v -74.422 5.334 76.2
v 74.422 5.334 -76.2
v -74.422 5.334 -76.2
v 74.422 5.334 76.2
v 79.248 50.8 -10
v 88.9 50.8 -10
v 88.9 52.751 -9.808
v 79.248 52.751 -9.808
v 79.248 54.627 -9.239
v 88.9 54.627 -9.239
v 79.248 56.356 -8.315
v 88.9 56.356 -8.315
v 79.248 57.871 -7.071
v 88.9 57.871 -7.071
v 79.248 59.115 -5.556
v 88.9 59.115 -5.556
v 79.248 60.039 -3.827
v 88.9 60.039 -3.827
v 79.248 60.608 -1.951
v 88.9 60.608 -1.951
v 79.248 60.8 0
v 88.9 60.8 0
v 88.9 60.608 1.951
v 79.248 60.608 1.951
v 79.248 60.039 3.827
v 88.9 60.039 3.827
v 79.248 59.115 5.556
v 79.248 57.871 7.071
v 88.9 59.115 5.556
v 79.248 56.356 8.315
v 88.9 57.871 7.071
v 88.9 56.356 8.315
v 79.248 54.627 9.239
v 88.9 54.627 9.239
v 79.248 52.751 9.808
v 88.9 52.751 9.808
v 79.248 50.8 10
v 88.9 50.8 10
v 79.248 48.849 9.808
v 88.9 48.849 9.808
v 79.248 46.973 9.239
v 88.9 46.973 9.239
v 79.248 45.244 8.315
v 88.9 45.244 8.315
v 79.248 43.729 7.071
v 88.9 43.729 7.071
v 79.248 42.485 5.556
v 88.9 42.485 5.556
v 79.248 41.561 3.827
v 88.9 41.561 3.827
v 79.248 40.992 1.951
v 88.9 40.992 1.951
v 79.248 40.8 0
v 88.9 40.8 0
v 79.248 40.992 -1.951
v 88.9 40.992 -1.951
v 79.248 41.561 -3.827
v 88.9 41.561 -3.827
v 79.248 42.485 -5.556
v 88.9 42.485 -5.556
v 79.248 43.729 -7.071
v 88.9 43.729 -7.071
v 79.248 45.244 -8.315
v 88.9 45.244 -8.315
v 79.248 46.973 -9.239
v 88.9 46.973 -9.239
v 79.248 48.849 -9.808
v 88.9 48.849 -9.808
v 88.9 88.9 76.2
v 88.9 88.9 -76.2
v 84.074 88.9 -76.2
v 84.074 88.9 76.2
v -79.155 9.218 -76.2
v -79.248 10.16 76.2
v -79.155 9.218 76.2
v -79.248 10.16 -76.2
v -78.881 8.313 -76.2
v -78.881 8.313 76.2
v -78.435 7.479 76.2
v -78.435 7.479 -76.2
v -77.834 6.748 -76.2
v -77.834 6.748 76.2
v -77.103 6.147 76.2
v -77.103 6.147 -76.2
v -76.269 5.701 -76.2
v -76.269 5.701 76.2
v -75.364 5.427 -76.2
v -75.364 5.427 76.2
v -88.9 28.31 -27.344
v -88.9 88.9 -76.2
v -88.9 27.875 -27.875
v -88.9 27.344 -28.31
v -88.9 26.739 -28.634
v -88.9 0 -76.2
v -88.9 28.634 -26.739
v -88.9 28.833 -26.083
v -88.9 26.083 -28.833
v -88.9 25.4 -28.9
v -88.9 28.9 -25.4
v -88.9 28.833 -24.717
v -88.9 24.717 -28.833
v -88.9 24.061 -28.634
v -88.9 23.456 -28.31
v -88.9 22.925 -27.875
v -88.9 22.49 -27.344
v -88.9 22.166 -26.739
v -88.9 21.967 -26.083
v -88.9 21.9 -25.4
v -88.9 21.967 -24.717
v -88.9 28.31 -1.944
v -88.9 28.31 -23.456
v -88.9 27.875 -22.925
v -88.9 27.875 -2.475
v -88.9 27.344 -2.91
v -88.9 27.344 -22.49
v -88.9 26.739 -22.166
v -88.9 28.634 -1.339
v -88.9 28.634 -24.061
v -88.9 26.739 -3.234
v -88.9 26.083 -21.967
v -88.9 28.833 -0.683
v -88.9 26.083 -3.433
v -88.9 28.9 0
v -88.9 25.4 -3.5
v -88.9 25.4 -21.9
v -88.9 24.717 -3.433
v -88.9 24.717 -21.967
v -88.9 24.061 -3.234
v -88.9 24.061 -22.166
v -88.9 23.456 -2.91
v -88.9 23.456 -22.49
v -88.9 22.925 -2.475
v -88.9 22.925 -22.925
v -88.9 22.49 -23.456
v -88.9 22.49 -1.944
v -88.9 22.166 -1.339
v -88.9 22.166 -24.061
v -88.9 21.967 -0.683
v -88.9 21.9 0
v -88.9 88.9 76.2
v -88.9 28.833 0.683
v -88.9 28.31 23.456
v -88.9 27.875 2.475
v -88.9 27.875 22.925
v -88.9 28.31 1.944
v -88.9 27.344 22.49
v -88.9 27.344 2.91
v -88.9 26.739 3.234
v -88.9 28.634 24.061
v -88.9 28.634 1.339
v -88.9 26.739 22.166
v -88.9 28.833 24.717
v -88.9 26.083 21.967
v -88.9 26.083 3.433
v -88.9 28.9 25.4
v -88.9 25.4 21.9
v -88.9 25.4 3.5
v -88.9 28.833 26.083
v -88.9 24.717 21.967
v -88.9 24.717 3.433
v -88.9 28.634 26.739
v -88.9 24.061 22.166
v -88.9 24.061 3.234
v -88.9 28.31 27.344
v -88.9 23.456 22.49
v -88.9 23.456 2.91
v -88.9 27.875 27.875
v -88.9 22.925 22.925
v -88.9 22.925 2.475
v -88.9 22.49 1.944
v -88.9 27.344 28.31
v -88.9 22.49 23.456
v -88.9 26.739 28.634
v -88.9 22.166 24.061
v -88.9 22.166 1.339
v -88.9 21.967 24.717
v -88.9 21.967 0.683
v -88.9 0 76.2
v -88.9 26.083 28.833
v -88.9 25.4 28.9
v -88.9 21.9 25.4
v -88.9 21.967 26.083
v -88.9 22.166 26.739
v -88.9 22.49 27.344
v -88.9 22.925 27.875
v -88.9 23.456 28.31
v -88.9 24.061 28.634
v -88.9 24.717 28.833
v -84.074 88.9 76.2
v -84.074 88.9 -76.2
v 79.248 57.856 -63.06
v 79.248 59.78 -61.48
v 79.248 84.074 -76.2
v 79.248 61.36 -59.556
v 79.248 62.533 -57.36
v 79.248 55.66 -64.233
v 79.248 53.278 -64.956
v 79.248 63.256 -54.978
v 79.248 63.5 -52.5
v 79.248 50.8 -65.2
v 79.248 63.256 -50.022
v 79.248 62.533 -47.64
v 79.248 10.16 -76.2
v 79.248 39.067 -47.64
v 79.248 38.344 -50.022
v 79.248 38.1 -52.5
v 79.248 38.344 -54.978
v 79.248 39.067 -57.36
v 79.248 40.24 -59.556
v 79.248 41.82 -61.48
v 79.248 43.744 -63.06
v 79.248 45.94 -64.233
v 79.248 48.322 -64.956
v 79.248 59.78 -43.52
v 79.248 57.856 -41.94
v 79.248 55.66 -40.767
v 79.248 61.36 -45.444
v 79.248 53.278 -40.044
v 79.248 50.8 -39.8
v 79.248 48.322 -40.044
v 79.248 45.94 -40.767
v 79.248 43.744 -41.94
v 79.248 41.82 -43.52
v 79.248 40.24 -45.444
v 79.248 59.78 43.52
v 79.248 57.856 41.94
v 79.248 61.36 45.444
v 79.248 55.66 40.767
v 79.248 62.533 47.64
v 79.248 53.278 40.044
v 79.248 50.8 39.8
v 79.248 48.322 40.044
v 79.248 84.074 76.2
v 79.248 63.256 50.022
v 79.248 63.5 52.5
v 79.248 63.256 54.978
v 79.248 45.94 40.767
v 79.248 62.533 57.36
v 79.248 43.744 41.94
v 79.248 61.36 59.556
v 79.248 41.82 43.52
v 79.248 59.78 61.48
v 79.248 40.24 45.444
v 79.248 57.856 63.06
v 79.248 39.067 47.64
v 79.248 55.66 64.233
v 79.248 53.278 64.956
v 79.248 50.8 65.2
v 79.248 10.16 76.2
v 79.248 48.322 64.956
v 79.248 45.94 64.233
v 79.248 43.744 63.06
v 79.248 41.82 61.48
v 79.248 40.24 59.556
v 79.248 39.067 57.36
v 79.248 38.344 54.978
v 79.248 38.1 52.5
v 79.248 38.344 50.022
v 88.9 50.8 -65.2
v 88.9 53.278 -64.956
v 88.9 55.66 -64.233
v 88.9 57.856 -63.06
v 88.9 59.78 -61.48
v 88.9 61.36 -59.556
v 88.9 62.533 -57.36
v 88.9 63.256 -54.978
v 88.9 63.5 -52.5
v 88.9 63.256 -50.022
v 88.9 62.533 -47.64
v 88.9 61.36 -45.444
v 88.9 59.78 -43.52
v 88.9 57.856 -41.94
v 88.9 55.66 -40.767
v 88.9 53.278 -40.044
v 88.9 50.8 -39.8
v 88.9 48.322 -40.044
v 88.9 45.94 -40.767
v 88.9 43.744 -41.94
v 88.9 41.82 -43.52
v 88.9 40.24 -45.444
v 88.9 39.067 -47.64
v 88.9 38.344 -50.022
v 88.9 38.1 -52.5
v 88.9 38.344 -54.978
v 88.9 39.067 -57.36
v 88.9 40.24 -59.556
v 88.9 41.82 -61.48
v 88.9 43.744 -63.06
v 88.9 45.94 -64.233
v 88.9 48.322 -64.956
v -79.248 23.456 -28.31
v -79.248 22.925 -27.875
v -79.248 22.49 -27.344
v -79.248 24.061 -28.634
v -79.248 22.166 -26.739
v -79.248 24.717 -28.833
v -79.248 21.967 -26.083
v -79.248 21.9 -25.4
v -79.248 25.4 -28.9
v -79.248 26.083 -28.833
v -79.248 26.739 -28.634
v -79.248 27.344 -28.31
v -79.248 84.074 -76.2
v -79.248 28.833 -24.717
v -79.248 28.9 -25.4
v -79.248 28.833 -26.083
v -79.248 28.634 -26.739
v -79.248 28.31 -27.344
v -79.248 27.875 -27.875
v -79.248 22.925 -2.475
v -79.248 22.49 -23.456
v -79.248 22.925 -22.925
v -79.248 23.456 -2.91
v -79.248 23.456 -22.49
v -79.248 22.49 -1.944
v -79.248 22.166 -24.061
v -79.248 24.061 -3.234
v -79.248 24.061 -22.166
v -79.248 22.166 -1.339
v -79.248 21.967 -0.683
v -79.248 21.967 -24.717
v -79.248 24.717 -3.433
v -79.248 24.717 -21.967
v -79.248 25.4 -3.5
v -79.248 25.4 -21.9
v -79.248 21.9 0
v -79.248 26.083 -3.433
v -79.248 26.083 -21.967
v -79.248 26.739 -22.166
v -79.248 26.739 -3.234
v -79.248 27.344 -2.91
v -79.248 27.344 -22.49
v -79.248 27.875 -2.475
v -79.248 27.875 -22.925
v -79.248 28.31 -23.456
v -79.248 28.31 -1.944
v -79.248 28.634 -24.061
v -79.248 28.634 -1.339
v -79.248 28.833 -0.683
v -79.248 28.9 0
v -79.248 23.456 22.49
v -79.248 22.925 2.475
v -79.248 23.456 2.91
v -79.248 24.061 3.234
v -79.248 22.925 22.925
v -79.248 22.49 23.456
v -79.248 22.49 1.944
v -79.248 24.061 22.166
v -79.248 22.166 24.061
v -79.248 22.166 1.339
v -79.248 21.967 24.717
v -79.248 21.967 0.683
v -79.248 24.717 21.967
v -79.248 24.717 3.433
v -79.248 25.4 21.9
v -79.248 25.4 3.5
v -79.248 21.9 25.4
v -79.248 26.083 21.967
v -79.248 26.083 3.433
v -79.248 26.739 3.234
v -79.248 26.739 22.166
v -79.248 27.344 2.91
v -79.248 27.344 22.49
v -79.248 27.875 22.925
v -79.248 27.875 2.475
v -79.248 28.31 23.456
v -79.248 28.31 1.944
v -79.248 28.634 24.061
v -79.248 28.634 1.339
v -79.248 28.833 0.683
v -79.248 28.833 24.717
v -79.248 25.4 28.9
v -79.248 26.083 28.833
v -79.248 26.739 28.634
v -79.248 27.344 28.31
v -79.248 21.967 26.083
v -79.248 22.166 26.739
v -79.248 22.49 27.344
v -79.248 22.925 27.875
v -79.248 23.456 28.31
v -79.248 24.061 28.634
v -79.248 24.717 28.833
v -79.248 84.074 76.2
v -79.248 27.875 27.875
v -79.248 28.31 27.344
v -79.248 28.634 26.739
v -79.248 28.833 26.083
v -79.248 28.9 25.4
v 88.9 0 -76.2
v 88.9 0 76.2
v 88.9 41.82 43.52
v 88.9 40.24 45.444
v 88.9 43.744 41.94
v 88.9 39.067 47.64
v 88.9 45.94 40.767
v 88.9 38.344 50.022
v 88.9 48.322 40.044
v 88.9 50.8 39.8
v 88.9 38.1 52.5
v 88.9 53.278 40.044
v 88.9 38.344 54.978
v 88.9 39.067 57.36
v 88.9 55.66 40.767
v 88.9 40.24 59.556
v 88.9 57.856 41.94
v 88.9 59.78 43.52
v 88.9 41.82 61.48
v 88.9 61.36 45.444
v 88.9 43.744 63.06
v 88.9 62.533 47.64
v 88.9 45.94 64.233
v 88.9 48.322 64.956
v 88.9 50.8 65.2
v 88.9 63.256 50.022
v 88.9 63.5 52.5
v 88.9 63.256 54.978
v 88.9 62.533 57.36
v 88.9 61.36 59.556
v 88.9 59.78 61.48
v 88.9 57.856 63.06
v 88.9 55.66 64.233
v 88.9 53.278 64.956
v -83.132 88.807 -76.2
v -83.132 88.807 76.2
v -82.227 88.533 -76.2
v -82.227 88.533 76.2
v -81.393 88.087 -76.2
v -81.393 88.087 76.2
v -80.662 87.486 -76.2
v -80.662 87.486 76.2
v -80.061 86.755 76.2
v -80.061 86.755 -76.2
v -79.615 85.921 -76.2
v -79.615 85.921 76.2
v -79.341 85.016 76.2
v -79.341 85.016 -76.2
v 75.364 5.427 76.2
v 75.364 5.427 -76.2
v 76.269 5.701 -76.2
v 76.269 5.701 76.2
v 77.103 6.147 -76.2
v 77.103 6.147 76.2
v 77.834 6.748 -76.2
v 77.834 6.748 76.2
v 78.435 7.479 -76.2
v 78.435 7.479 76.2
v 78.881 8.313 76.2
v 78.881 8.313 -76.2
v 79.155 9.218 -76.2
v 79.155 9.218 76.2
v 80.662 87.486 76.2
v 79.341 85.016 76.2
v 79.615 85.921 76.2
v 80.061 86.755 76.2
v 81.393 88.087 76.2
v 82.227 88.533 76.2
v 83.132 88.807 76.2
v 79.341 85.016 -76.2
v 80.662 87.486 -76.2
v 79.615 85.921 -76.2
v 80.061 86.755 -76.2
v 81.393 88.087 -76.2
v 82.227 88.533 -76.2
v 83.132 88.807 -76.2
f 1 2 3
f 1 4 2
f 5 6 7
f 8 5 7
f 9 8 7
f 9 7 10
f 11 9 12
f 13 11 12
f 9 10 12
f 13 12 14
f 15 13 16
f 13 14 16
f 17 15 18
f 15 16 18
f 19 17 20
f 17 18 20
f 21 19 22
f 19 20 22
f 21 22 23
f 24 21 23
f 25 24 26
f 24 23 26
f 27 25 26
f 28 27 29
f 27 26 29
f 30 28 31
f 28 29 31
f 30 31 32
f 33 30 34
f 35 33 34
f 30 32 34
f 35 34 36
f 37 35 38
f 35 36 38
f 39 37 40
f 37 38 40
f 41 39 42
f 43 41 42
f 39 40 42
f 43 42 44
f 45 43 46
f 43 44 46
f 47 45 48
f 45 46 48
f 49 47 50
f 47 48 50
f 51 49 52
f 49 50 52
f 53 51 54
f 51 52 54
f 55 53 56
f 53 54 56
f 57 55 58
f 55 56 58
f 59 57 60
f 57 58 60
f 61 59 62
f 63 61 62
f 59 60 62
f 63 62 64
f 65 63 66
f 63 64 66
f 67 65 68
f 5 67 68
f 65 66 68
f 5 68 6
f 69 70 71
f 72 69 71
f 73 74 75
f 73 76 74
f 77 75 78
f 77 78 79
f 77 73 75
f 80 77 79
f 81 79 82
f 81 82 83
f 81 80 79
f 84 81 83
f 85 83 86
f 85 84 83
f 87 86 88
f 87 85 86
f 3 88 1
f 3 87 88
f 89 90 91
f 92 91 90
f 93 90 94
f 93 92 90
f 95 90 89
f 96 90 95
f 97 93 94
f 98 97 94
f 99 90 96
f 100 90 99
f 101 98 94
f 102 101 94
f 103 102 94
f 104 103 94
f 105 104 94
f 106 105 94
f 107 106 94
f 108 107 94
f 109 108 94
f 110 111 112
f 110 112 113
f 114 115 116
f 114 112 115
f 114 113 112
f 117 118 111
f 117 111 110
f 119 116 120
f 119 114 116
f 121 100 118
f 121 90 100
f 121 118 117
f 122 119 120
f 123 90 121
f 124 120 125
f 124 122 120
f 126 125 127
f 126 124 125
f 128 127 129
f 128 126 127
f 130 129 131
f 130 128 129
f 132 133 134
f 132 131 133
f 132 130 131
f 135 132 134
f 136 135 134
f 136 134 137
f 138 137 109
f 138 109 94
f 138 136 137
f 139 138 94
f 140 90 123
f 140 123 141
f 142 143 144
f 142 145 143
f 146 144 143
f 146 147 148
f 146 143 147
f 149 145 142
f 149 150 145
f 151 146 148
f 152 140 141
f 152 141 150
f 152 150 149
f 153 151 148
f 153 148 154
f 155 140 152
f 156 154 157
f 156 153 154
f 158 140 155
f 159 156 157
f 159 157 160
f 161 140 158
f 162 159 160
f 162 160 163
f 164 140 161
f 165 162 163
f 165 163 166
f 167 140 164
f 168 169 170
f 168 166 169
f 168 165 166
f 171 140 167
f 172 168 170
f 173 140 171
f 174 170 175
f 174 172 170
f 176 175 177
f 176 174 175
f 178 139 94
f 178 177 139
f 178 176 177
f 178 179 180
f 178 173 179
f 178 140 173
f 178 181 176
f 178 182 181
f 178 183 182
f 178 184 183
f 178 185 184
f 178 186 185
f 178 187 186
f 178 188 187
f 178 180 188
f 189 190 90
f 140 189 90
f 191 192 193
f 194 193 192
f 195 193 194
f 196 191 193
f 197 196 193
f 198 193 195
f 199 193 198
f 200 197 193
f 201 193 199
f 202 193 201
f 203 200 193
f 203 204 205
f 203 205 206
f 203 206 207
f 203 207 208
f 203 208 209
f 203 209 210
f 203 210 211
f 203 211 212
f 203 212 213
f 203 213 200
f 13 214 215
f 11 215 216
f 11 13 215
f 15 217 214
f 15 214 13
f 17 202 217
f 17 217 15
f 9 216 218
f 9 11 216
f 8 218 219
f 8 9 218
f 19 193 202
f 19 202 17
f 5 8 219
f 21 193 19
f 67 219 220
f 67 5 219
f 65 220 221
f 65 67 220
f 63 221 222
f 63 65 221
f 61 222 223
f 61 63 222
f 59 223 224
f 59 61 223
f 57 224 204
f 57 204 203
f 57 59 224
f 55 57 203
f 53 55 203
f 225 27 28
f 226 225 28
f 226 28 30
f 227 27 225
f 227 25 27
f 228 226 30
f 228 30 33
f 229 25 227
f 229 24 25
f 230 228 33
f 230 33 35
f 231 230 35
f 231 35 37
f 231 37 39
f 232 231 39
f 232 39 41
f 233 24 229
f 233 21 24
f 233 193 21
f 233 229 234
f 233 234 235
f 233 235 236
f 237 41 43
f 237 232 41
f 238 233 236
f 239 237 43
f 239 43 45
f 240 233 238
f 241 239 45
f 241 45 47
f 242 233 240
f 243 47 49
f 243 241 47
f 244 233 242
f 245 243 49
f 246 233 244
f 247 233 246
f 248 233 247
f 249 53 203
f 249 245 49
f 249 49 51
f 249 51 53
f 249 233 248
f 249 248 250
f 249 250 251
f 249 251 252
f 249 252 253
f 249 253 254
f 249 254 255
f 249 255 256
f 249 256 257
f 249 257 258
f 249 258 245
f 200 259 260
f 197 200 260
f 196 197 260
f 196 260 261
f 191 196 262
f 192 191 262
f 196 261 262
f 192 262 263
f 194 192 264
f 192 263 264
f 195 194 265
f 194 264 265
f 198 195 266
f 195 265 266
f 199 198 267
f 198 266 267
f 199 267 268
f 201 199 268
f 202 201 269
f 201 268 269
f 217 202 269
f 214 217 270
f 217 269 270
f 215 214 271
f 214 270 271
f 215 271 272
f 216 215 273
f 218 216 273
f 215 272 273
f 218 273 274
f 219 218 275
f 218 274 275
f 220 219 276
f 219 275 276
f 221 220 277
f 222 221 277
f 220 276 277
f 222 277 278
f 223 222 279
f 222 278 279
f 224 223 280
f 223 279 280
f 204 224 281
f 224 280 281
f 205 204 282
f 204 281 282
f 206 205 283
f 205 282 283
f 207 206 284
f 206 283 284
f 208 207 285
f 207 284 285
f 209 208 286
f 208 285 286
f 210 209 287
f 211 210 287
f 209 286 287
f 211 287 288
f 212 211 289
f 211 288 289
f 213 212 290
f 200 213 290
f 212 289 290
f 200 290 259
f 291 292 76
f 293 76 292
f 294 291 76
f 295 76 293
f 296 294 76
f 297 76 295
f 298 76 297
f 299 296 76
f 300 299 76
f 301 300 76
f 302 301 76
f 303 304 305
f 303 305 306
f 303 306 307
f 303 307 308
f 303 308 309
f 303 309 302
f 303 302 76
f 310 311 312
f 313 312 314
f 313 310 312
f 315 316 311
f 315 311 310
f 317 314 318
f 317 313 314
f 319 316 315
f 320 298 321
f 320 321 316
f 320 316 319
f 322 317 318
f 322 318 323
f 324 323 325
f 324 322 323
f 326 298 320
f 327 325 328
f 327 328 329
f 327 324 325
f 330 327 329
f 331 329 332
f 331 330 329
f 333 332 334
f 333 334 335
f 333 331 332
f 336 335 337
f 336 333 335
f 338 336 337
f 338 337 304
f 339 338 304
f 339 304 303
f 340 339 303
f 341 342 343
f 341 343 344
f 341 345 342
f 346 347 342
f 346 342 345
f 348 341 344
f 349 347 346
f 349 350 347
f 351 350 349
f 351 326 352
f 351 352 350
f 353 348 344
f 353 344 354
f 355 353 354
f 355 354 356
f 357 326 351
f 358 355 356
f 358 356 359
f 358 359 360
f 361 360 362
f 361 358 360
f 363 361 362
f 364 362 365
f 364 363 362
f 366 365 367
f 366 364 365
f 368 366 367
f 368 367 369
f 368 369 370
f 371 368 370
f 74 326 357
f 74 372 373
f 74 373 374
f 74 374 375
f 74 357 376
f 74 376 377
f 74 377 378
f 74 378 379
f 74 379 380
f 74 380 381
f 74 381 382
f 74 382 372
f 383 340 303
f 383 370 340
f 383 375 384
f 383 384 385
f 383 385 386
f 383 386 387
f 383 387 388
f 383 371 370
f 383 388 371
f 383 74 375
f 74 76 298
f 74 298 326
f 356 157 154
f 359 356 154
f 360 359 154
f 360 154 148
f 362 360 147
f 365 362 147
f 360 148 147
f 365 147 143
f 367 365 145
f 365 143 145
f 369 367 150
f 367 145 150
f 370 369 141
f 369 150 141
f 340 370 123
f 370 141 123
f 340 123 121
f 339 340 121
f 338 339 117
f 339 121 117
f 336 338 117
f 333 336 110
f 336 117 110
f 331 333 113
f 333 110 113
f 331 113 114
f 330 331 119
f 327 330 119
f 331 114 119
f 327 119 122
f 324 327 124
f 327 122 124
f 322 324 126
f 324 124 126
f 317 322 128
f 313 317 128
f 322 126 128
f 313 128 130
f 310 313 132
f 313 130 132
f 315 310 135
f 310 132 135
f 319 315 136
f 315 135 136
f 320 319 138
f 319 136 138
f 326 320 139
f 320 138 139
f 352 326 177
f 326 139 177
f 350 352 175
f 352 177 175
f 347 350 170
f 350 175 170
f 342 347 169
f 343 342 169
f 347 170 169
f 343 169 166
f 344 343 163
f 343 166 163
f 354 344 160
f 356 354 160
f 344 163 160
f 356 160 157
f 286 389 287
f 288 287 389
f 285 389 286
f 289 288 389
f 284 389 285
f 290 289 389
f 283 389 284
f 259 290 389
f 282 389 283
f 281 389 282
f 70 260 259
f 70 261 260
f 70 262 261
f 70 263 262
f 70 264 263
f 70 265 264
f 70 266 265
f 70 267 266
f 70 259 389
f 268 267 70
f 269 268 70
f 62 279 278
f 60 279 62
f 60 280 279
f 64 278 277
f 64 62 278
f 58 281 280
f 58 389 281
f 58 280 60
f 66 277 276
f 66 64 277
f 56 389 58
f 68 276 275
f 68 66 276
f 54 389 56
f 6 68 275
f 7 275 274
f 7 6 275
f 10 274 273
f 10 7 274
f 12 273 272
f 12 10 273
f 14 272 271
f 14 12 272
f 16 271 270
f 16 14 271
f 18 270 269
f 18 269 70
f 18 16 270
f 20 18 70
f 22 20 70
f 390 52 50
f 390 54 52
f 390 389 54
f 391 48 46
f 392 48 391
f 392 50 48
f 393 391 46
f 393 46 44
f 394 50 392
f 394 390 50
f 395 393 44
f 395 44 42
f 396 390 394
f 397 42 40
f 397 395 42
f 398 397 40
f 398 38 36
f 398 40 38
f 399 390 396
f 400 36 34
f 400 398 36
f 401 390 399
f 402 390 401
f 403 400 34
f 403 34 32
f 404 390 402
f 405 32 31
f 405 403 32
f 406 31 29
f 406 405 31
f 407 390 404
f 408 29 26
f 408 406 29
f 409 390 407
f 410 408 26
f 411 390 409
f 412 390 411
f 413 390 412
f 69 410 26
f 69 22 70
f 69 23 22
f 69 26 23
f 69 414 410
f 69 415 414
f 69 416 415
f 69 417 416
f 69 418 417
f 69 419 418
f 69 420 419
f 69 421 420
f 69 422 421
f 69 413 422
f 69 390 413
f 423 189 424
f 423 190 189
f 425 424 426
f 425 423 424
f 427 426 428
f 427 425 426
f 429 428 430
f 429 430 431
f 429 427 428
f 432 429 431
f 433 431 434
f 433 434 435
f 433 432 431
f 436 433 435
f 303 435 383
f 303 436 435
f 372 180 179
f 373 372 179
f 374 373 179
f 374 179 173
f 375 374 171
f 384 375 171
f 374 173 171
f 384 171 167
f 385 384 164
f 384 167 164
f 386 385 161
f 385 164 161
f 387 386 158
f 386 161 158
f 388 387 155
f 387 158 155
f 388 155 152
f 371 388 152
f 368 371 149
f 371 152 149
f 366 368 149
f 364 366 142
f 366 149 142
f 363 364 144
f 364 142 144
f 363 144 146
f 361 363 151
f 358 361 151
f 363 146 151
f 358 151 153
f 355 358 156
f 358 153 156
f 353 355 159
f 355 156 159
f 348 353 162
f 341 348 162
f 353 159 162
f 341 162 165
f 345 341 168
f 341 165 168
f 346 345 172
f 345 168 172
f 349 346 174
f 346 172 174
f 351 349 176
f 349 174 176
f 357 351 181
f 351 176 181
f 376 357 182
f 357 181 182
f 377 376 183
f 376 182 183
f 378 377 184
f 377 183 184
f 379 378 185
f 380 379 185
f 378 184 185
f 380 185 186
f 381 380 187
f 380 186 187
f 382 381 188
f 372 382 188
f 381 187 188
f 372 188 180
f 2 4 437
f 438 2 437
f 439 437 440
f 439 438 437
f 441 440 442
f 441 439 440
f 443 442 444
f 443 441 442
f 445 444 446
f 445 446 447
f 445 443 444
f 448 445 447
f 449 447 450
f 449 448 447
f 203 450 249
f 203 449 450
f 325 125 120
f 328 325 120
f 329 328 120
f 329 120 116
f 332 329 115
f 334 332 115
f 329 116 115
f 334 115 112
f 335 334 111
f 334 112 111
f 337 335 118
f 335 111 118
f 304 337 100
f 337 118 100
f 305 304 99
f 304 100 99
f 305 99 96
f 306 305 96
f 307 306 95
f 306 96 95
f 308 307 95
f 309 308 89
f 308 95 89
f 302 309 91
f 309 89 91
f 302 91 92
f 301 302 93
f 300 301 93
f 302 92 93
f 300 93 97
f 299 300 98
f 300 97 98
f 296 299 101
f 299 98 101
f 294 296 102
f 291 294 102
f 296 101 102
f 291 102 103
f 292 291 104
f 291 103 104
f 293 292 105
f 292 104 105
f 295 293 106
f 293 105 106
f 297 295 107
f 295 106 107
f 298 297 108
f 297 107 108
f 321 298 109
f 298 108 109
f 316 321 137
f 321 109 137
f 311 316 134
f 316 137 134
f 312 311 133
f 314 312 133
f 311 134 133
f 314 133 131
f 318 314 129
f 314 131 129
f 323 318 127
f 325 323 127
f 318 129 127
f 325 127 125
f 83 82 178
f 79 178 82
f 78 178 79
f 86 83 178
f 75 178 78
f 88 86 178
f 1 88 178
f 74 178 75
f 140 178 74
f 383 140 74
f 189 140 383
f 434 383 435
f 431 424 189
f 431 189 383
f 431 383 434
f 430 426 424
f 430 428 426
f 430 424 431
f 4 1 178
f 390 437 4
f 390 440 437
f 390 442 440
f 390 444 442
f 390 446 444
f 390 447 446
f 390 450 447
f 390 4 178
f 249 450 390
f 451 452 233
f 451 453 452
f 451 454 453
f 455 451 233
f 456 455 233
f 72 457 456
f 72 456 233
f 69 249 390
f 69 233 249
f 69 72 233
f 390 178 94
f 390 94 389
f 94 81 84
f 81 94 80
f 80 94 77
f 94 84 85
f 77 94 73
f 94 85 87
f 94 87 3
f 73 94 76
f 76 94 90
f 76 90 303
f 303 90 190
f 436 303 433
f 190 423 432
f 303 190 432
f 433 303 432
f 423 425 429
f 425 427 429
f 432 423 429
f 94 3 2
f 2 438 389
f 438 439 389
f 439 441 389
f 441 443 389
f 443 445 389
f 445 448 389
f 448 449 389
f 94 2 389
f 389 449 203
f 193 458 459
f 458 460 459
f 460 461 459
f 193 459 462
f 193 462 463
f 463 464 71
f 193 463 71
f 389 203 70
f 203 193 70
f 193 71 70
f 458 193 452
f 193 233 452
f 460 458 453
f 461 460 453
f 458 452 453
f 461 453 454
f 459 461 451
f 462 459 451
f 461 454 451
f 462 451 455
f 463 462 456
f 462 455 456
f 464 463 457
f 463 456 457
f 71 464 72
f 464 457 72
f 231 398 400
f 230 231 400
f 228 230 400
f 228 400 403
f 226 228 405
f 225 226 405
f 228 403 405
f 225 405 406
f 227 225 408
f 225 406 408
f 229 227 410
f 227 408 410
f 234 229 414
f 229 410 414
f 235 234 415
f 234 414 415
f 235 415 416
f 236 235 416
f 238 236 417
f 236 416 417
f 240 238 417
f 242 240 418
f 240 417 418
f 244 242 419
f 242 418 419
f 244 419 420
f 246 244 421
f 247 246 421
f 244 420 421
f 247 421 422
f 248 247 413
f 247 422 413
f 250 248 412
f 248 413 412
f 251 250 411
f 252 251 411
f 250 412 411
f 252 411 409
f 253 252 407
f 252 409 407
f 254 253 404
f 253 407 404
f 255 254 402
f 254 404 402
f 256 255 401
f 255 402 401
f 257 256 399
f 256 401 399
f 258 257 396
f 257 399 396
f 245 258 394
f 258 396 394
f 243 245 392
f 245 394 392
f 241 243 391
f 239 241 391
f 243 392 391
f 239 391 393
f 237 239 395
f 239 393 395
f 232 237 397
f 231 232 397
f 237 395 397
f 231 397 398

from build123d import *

# Parameters (mm, degrees)
BOSS_EXTRUDE1_DEPTH = 76.2
FILLET1_R           = 4.826
SKETCH2_R           = 12.7
SKETCH2_R_2         = 10
CUT_EXTRUDE1_DEPTH  = 9.652
SKETCH3_R           = 3.5
CUT_EXTRUDE2_DEPTH  = 9.652


with BuildPart() as part:
    # Sketch1 → Boss-Extrude1 (new body, symmetric)
    with BuildSketch(Plane.XY):
        Polygon((-79.248, 88.9), (-88.9, 88.9), (-88.9, 0), (88.9, 0), (88.9, 88.9), (79.248, 88.9), (79.248, 5.334), (-79.248, 5.334), align=None)
    extrude(amount=BOSS_EXTRUDE1_DEPTH, both=True)

    # Fillet1
    fillet1_edges = [part.edges().sort_by_distance(p)[0] for p in [
        (-79.248, 5.334, 0),
        (79.248, 5.334, 0),
        (79.248, 88.9, 0),
        (-79.248, 88.9, 0),
    ]]
    fillet(fillet1_edges, radius=FILLET1_R)

    # Sketch2 → Cut-Extrude1 (cut)
    with BuildSketch(Plane(origin=(88.9, 0, 0), x_dir=(0, 0, -1), z_dir=(1, 0, 0))):
        with Locations((52.5, 50.8)):
            Circle(SKETCH2_R)
        with Locations((-52.5, 50.8)):
            Circle(SKETCH2_R)
        with Locations((0, 50.8)):
            Circle(SKETCH2_R_2)
    extrude(amount=-CUT_EXTRUDE1_DEPTH, mode=Mode.SUBTRACT)

    # Sketch3 → Cut-Extrude2 (cut)
    with BuildSketch(Plane.ZY.offset(88.9)):
        with Locations((-25.4, 25.4)):
            Circle(SKETCH3_R)
        with Locations((25.4, 25.4)):
            Circle(SKETCH3_R)
        with Locations((0, 25.4)):
            Circle(SKETCH3_R)
    extrude(amount=-CUT_EXTRUDE2_DEPTH, mode=Mode.SUBTRACT)


solid = part.part
